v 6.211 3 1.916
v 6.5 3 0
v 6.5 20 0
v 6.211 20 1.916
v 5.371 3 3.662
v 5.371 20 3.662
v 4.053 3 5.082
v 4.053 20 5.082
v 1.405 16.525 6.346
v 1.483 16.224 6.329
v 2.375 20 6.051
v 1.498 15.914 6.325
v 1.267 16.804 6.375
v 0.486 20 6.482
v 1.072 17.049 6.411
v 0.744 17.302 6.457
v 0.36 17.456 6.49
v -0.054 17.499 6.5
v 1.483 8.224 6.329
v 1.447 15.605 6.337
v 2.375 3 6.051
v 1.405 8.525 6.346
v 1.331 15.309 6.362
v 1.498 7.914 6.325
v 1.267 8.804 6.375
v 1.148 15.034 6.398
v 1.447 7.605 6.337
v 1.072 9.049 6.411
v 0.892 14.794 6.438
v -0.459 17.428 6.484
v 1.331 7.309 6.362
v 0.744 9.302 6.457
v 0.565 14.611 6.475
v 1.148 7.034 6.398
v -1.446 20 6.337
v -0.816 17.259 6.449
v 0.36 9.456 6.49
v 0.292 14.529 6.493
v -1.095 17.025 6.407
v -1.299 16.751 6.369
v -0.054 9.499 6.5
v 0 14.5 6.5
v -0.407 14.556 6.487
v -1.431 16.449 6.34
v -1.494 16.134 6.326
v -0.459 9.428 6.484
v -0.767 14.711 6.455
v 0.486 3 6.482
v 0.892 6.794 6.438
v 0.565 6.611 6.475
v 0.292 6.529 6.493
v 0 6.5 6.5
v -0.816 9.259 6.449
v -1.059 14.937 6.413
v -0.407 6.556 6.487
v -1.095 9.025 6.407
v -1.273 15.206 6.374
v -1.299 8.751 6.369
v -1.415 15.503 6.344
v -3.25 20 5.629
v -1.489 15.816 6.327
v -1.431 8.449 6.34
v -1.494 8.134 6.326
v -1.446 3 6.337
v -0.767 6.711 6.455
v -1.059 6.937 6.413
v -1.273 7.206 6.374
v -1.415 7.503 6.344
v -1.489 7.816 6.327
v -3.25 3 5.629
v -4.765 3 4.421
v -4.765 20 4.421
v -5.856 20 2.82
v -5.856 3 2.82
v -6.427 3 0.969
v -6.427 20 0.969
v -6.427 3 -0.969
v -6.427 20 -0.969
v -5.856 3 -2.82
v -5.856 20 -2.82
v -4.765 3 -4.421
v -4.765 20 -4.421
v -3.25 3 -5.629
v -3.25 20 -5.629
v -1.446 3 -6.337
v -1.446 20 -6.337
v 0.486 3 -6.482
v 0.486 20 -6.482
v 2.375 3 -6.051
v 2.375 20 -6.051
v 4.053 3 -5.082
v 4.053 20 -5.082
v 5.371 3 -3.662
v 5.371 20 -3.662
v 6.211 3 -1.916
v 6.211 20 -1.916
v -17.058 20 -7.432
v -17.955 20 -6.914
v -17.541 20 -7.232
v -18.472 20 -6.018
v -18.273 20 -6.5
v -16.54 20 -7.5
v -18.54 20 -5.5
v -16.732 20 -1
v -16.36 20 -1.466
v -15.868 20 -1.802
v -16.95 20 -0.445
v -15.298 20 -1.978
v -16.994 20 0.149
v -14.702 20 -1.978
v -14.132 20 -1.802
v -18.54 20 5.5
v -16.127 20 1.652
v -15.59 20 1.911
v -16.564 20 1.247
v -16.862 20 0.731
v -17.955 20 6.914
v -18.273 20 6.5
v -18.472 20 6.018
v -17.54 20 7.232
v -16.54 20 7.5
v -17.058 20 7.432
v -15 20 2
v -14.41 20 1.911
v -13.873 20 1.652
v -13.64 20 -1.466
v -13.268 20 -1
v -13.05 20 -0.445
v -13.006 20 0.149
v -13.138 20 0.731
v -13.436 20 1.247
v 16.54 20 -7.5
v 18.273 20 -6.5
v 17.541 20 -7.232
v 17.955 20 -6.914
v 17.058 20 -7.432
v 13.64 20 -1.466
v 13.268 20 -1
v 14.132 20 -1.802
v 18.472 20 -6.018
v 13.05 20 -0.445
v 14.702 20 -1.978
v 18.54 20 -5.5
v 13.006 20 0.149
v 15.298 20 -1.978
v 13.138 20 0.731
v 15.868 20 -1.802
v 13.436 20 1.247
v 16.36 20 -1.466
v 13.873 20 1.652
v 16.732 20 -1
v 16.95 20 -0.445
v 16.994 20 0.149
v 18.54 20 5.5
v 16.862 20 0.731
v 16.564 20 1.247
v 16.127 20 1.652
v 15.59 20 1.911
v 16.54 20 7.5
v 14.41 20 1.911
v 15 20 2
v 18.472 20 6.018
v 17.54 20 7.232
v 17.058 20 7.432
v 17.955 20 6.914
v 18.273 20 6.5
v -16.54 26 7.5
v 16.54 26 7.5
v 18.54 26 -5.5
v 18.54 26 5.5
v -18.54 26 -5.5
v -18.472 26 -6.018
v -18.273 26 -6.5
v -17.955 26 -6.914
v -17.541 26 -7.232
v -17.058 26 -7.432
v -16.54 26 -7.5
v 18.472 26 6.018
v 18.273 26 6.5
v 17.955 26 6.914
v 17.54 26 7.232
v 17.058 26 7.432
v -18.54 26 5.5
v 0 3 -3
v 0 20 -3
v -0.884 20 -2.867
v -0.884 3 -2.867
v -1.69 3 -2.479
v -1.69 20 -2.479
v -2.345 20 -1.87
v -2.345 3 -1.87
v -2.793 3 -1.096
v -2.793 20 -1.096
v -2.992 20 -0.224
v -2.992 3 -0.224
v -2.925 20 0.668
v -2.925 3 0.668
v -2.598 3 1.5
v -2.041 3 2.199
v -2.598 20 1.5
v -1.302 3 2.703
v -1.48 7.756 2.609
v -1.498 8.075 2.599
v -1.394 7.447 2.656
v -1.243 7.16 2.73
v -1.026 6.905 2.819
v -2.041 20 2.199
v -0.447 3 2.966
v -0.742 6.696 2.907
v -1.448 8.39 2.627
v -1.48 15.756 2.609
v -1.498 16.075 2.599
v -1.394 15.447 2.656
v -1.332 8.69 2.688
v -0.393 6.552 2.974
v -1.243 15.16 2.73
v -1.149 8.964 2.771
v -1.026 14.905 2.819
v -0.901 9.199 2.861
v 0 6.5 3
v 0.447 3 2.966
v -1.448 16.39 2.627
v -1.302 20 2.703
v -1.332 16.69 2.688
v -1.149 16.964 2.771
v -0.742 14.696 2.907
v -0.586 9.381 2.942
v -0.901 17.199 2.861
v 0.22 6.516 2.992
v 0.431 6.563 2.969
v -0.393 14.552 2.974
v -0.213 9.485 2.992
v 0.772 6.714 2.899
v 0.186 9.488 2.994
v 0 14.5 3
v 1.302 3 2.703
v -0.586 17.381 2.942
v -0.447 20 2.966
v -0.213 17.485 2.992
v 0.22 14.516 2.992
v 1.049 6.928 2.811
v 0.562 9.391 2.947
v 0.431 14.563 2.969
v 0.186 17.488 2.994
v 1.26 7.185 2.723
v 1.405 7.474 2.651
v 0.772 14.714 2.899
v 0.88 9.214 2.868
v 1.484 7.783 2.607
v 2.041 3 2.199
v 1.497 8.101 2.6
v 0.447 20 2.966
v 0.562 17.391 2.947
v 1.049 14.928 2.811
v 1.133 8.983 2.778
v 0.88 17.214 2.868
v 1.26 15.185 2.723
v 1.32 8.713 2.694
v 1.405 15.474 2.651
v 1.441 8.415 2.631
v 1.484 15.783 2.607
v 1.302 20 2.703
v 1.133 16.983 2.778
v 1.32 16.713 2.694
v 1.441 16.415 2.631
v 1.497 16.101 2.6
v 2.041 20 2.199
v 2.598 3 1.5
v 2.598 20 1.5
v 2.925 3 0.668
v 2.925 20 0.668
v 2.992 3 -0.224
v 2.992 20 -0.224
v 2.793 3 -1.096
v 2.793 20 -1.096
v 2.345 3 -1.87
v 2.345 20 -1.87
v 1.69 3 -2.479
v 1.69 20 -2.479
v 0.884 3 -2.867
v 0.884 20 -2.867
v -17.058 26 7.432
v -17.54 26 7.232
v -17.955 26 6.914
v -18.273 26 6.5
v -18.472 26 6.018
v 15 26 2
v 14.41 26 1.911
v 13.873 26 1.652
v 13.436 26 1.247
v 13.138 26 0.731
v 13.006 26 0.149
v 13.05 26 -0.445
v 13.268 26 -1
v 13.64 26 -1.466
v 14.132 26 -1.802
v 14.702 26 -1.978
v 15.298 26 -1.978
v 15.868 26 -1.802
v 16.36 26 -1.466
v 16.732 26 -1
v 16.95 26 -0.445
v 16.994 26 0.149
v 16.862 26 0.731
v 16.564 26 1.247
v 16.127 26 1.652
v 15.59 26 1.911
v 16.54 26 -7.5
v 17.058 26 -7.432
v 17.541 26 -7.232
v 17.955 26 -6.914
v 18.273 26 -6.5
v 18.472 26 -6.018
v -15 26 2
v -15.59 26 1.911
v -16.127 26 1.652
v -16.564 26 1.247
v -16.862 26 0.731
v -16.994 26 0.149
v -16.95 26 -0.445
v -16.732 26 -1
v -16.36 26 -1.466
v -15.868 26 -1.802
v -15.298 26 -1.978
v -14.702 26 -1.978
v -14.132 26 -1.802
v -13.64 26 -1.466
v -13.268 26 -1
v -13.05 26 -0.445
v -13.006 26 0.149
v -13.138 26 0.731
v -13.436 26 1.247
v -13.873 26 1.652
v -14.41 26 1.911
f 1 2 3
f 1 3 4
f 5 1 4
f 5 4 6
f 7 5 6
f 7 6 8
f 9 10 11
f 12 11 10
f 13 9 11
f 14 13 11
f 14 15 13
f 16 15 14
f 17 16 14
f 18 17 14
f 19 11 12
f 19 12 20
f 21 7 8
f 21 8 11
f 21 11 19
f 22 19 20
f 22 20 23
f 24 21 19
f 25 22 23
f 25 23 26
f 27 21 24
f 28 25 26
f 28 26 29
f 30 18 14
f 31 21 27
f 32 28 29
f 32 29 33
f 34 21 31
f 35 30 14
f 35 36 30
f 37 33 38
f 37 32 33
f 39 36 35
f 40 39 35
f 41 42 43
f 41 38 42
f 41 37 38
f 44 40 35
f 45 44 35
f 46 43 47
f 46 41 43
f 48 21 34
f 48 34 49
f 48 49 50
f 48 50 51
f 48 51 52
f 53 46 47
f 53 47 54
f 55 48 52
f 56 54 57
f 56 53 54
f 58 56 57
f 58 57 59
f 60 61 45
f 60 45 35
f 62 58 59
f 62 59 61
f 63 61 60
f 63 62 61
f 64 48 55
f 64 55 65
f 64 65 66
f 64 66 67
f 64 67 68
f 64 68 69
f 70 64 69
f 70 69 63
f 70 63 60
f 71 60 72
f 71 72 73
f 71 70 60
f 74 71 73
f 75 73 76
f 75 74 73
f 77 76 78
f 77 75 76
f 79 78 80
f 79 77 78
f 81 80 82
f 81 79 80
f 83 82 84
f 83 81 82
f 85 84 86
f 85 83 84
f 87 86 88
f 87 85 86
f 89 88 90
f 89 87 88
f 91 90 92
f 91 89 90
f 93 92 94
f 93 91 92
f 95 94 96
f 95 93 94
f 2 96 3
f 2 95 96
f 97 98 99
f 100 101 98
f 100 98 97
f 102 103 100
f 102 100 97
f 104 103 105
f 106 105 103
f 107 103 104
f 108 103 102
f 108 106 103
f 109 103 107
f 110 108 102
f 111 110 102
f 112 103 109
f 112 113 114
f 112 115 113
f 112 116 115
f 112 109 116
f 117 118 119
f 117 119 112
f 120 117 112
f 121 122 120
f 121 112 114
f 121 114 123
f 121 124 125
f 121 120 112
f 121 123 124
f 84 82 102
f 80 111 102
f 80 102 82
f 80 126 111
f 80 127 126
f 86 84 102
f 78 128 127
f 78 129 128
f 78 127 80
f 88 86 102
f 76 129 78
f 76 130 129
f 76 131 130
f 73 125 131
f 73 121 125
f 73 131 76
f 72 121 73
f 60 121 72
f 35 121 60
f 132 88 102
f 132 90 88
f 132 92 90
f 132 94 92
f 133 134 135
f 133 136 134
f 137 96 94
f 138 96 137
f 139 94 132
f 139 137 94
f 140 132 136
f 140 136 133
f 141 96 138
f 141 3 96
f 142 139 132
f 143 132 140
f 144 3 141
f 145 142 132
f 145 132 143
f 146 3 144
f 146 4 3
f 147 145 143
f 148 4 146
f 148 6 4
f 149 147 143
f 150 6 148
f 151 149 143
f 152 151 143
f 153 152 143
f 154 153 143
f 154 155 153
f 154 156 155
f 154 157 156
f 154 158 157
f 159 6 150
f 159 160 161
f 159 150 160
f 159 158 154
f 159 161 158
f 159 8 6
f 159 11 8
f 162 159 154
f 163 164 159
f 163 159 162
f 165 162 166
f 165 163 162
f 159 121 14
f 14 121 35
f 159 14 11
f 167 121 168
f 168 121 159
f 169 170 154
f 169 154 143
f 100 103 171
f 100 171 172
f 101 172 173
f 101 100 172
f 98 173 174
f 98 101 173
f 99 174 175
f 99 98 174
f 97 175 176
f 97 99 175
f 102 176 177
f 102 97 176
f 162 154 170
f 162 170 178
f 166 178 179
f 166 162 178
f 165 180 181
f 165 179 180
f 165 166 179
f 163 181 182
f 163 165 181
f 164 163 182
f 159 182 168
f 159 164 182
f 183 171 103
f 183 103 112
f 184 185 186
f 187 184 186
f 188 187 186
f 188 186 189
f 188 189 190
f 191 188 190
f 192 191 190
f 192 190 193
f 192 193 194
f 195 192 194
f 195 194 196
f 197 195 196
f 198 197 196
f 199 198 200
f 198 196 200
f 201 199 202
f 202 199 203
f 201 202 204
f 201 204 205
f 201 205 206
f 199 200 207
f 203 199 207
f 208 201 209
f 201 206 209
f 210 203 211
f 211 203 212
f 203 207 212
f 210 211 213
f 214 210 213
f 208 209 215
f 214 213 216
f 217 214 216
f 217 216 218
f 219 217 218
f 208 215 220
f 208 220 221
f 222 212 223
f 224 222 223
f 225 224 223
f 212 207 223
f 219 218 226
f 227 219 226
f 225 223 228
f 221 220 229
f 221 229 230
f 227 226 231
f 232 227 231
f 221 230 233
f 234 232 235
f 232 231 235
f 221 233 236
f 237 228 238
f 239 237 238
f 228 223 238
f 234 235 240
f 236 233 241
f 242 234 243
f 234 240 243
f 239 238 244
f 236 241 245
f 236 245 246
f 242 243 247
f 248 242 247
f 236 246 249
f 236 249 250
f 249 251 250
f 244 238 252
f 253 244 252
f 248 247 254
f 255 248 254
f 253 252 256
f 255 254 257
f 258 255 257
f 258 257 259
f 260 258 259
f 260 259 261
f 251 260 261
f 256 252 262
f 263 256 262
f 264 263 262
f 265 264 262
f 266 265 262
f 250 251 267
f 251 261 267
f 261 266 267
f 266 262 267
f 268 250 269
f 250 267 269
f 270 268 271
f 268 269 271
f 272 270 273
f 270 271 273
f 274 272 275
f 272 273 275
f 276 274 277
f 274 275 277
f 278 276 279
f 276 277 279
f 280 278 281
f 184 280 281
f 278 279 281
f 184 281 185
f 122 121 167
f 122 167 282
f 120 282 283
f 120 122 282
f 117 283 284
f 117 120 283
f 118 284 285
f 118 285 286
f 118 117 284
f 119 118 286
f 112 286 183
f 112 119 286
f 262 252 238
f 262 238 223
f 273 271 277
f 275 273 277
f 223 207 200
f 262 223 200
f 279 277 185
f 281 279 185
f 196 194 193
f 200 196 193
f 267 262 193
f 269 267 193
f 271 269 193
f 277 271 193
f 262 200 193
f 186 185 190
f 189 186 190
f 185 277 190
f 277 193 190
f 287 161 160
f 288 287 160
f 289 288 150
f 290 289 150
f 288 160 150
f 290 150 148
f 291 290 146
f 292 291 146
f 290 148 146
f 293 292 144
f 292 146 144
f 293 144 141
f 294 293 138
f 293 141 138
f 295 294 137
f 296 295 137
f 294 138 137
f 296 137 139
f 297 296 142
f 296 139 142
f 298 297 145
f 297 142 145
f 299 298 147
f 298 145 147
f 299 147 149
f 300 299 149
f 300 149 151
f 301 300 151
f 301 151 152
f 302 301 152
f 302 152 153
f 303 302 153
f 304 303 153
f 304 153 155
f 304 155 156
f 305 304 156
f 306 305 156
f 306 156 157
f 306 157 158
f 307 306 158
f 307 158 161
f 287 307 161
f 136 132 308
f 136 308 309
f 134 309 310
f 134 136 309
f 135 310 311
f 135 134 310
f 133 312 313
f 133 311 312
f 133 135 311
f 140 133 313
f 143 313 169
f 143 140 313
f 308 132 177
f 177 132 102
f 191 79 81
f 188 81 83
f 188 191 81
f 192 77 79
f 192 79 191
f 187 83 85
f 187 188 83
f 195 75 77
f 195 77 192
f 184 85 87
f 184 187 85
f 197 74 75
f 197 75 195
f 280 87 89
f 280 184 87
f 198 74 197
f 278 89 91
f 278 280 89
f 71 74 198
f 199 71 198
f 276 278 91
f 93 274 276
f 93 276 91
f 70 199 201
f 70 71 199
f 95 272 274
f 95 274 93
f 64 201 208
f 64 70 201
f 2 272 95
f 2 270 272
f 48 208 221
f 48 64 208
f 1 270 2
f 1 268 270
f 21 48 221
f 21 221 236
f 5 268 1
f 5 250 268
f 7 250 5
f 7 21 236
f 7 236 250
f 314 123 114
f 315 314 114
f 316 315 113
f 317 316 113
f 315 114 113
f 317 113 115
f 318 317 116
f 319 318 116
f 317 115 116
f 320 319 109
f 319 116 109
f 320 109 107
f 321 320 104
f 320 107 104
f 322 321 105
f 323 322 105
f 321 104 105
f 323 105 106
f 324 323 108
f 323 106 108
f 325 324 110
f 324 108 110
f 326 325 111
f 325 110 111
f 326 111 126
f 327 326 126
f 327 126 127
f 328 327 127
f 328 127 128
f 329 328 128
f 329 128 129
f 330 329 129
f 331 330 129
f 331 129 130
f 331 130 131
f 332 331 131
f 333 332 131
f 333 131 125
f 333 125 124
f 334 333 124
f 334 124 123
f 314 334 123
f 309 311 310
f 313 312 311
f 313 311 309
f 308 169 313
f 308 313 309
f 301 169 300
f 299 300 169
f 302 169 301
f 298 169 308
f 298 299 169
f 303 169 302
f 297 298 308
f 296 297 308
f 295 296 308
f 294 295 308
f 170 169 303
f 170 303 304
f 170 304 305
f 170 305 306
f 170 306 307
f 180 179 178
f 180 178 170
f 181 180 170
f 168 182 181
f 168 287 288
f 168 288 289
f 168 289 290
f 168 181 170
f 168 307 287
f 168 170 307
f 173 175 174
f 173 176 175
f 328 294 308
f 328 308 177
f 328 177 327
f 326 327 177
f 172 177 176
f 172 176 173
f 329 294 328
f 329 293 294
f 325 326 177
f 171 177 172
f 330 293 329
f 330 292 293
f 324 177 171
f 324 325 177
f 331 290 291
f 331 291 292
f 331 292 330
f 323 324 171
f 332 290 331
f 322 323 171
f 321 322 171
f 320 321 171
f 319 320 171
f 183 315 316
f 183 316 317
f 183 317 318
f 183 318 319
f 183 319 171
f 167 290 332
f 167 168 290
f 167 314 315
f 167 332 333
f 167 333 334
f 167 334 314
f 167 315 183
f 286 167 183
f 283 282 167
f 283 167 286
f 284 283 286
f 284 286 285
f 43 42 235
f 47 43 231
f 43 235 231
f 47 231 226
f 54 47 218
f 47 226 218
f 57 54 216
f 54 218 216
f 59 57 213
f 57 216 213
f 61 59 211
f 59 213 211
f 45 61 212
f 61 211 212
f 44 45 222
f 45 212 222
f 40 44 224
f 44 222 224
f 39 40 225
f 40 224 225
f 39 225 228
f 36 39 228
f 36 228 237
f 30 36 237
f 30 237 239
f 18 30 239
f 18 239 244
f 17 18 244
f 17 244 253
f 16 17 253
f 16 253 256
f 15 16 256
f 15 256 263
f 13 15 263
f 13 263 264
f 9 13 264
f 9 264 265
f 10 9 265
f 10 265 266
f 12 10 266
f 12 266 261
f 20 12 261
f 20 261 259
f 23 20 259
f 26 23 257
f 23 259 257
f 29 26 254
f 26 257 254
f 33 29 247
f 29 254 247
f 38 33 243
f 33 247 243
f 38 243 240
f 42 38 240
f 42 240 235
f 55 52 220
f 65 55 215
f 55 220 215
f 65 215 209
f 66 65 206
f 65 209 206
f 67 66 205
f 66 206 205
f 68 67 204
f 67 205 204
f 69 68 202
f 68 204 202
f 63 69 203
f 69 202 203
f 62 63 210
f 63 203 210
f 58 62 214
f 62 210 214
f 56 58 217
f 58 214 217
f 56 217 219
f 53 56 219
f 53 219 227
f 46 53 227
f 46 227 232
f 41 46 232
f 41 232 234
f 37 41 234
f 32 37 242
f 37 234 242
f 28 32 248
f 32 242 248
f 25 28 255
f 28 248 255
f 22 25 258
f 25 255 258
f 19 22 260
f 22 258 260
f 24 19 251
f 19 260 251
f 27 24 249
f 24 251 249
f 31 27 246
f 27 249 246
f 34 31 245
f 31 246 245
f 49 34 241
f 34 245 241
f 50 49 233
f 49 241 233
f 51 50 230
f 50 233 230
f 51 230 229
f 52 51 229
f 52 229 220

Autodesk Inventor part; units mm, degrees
ref_plane "YZ Plane" through (0, 0, 0) normal (1, 0, 0) x (0, 1, 0)
ref_plane "XZ Plane" through (0, 0, 0) normal (0, 1, 0) x (-1, 0, 0)
ref_plane "XY Plane" through (0, 0, 0) normal (0, 0, 1) x (1, 0, 0)
sketch "Skizze1" plane through (0, 0, 0) normal (0, 1, 0) x (-1, 0, 0)
  circle A0 centre (0, 0) radius 20
  dimension "d0" = 40
extrude "Extrusion1" add sketch "Skizze1" along normal blind 26
ref_plane "Arbeitsebene1" through (0, 26, 0) normal (0, 1, 0) x (1, 0, 0)
sketch "Skizze2" plane through (0, 26, 0) normal (0, 1, 0) x (1, 0, 0)
  circle A0 centre (0, 0) radius 20 projected
  circle A1 centre (0, 0) radius 20 construction
  circle A2 centre (0, 0) radius 20 construction
  line L0 (-15, 0) -> (15, 0) construction
  dimension "d42" = 15
  dimension "d43" = 15
ref_plane "Arbeitsebene2" through (0, 0, 0) normal (0, -1, 0) x (1, 0, 0)
sketch "Skizze3" plane through (0, 0, 0) normal (0, -1, 0) x (1, 0, 0)
  circle A0 centre (0, 0) radius 20 projected
hole "Bohrung2" at (0, 0, 0) direction (0, 1, 0) diameter 6 depth 20
sketch "Skizze4" plane through (0, 0, 0) normal (0, -1, 0) x (1, 0, 0)
  point P0 (0, 0)
sketch "Skizze5" plane through (0, 0, 0) normal (0, -1, 0) x (1, 0, 0)
  line L0 (0, 0) -> (0, 20) construction
  circle A0 centre (0, 0) radius 20 construction
ref_plane "Arbeitsebene3" through (0, 0, 20) normal (0, 0, 1) x (1, 0, 0)
sketch "Skizze6" plane through (0, 0, 20) normal (0, 0, 1) x (1, 0, 0)
  line L0 (0, 0) -> (0, 27.6738) construction
  point P0 (0, 8)
  point P1 (0, 16)
  dimension "d25" = 8
  dimension "d26" = 8
hole "Bohrung3" at (0, 16, 20) at (0, 8, 20) direction (0, 0, -1) diameter 3 depth 20 tip angle 118
sketch "Skizze7" plane through (0, 0, 0) normal (0, -1, 0) x (1, 0, 0)
  circle A0 centre (0, 0) radius 6.5
  circle A1 centre (0, 0) radius 20
  dimension "d38" = 13
  dimension "d39" = 40
extrude "Extrusion2" cut sketch "Skizze7" against normal blind 20
hole "Bohrung4" at (-15, 26, 0) at (15, 26, 0) direction (0, -1, 0) diameter 4 end through all
sketch "Skizze8" plane through (0, 0, 0) normal (0, -1, 0) x (1, 0, 0)
  line L0 (-20, 7.5) -> (20, 7.5)
  line L1 (20, 7.5) -> (20, -7.5)
  line L2 (20, -7.5) -> (-20, -7.5)
  line L3 (-20, -7.5) -> (-20, 7.5)
  line L4 (-20, 7.5) -> (20, -7.5) construction
  line L5 (20, 7.5) -> (-20, -7.5) construction
  point P0 (0, 0)
  dimension "d52" = 40
  dimension "d53" = 15
extrude "Extrusion3" cut sketch "Skizze8" against normal through all keep common part
sketch "Skizze9" plane through (0, 0, 0) normal (0, -1, 0) x (1, 0, 0)
  line L0 (-15, -15) -> (15, -15)
  line L1 (15, -15) -> (15, 15)
  line L2 (15, 15) -> (-15, 15)
  line L3 (-15, 15) -> (-15, -15)
  line L4 (-15, -15) -> (15, 15) construction
  line L5 (15, -15) -> (-15, 15) construction
  point P0 (0, 0)
  dimension "d56" = 30
  dimension "d57" = 30
extrude "Extrusion4" cut sketch "Skizze9" against normal blind 3
thread "Gewinde5" size "M3x0.5" class "6H" standard "ANSI Metric M Profile" full length
thread "Gewinde6" size "M3x0.5" class "6H" standard "ANSI Metric M Profile" full length
thread "Gewinde7" size "M4x0.7" class "6H" standard "ANSI Metric M Profile" full length
thread "Gewinde8" size "M4x0.7" class "6H" standard "ANSI Metric M Profile" full length
sketch "Skizze10" plane through (0, 26, 0) normal (0, 1, 0) x (1, 0, 0)
  arc A0 (-18.5405, 7.5) -> (-18.5405, -7.5) centre (0, 0) ccw projected
  line L0 (18.5405, 7.5) -> (-18.5405, 7.5)
  line L1 (-18.5405, 7.5) -> (-18.5405, -7.5)
  line L2 (-18.5405, -7.5) -> (18.5405, -7.5)
  line L3 (18.5405, -7.5) -> (18.5405, 7.5)
  line L4 (18.5405, 7.5) -> (-18.5405, -7.5) construction
  line L5 (-18.5405, 7.5) -> (18.5405, -7.5) construction
extrude "Extrusion5" cut sketch "Skizze10" against normal through all contours L0 L3 L2 L1 keep common part
fillet "Rundung1" radius 2 4 edges at (18.5405, 23, -7.5) (18.5405, 23, 7.5) (-18.5405, 23, -7.5) (-18.5405, 23, 7.5)
thread "Gewinde9" size "M3x0.5" class "6H" standard "ANSI Metric M Profile" full length
thread "Gewinde10" size "M3x0.5" class "6H" standard "ANSI Metric M Profile" full length
thread "Gewinde11" size "M4x0.7" class "6H" standard "ANSI Metric M Profile" full length
thread "Gewinde12" size "M4x0.7" class "6H" standard "ANSI Metric M Profile" full length
properties part number "spannring_achse"
